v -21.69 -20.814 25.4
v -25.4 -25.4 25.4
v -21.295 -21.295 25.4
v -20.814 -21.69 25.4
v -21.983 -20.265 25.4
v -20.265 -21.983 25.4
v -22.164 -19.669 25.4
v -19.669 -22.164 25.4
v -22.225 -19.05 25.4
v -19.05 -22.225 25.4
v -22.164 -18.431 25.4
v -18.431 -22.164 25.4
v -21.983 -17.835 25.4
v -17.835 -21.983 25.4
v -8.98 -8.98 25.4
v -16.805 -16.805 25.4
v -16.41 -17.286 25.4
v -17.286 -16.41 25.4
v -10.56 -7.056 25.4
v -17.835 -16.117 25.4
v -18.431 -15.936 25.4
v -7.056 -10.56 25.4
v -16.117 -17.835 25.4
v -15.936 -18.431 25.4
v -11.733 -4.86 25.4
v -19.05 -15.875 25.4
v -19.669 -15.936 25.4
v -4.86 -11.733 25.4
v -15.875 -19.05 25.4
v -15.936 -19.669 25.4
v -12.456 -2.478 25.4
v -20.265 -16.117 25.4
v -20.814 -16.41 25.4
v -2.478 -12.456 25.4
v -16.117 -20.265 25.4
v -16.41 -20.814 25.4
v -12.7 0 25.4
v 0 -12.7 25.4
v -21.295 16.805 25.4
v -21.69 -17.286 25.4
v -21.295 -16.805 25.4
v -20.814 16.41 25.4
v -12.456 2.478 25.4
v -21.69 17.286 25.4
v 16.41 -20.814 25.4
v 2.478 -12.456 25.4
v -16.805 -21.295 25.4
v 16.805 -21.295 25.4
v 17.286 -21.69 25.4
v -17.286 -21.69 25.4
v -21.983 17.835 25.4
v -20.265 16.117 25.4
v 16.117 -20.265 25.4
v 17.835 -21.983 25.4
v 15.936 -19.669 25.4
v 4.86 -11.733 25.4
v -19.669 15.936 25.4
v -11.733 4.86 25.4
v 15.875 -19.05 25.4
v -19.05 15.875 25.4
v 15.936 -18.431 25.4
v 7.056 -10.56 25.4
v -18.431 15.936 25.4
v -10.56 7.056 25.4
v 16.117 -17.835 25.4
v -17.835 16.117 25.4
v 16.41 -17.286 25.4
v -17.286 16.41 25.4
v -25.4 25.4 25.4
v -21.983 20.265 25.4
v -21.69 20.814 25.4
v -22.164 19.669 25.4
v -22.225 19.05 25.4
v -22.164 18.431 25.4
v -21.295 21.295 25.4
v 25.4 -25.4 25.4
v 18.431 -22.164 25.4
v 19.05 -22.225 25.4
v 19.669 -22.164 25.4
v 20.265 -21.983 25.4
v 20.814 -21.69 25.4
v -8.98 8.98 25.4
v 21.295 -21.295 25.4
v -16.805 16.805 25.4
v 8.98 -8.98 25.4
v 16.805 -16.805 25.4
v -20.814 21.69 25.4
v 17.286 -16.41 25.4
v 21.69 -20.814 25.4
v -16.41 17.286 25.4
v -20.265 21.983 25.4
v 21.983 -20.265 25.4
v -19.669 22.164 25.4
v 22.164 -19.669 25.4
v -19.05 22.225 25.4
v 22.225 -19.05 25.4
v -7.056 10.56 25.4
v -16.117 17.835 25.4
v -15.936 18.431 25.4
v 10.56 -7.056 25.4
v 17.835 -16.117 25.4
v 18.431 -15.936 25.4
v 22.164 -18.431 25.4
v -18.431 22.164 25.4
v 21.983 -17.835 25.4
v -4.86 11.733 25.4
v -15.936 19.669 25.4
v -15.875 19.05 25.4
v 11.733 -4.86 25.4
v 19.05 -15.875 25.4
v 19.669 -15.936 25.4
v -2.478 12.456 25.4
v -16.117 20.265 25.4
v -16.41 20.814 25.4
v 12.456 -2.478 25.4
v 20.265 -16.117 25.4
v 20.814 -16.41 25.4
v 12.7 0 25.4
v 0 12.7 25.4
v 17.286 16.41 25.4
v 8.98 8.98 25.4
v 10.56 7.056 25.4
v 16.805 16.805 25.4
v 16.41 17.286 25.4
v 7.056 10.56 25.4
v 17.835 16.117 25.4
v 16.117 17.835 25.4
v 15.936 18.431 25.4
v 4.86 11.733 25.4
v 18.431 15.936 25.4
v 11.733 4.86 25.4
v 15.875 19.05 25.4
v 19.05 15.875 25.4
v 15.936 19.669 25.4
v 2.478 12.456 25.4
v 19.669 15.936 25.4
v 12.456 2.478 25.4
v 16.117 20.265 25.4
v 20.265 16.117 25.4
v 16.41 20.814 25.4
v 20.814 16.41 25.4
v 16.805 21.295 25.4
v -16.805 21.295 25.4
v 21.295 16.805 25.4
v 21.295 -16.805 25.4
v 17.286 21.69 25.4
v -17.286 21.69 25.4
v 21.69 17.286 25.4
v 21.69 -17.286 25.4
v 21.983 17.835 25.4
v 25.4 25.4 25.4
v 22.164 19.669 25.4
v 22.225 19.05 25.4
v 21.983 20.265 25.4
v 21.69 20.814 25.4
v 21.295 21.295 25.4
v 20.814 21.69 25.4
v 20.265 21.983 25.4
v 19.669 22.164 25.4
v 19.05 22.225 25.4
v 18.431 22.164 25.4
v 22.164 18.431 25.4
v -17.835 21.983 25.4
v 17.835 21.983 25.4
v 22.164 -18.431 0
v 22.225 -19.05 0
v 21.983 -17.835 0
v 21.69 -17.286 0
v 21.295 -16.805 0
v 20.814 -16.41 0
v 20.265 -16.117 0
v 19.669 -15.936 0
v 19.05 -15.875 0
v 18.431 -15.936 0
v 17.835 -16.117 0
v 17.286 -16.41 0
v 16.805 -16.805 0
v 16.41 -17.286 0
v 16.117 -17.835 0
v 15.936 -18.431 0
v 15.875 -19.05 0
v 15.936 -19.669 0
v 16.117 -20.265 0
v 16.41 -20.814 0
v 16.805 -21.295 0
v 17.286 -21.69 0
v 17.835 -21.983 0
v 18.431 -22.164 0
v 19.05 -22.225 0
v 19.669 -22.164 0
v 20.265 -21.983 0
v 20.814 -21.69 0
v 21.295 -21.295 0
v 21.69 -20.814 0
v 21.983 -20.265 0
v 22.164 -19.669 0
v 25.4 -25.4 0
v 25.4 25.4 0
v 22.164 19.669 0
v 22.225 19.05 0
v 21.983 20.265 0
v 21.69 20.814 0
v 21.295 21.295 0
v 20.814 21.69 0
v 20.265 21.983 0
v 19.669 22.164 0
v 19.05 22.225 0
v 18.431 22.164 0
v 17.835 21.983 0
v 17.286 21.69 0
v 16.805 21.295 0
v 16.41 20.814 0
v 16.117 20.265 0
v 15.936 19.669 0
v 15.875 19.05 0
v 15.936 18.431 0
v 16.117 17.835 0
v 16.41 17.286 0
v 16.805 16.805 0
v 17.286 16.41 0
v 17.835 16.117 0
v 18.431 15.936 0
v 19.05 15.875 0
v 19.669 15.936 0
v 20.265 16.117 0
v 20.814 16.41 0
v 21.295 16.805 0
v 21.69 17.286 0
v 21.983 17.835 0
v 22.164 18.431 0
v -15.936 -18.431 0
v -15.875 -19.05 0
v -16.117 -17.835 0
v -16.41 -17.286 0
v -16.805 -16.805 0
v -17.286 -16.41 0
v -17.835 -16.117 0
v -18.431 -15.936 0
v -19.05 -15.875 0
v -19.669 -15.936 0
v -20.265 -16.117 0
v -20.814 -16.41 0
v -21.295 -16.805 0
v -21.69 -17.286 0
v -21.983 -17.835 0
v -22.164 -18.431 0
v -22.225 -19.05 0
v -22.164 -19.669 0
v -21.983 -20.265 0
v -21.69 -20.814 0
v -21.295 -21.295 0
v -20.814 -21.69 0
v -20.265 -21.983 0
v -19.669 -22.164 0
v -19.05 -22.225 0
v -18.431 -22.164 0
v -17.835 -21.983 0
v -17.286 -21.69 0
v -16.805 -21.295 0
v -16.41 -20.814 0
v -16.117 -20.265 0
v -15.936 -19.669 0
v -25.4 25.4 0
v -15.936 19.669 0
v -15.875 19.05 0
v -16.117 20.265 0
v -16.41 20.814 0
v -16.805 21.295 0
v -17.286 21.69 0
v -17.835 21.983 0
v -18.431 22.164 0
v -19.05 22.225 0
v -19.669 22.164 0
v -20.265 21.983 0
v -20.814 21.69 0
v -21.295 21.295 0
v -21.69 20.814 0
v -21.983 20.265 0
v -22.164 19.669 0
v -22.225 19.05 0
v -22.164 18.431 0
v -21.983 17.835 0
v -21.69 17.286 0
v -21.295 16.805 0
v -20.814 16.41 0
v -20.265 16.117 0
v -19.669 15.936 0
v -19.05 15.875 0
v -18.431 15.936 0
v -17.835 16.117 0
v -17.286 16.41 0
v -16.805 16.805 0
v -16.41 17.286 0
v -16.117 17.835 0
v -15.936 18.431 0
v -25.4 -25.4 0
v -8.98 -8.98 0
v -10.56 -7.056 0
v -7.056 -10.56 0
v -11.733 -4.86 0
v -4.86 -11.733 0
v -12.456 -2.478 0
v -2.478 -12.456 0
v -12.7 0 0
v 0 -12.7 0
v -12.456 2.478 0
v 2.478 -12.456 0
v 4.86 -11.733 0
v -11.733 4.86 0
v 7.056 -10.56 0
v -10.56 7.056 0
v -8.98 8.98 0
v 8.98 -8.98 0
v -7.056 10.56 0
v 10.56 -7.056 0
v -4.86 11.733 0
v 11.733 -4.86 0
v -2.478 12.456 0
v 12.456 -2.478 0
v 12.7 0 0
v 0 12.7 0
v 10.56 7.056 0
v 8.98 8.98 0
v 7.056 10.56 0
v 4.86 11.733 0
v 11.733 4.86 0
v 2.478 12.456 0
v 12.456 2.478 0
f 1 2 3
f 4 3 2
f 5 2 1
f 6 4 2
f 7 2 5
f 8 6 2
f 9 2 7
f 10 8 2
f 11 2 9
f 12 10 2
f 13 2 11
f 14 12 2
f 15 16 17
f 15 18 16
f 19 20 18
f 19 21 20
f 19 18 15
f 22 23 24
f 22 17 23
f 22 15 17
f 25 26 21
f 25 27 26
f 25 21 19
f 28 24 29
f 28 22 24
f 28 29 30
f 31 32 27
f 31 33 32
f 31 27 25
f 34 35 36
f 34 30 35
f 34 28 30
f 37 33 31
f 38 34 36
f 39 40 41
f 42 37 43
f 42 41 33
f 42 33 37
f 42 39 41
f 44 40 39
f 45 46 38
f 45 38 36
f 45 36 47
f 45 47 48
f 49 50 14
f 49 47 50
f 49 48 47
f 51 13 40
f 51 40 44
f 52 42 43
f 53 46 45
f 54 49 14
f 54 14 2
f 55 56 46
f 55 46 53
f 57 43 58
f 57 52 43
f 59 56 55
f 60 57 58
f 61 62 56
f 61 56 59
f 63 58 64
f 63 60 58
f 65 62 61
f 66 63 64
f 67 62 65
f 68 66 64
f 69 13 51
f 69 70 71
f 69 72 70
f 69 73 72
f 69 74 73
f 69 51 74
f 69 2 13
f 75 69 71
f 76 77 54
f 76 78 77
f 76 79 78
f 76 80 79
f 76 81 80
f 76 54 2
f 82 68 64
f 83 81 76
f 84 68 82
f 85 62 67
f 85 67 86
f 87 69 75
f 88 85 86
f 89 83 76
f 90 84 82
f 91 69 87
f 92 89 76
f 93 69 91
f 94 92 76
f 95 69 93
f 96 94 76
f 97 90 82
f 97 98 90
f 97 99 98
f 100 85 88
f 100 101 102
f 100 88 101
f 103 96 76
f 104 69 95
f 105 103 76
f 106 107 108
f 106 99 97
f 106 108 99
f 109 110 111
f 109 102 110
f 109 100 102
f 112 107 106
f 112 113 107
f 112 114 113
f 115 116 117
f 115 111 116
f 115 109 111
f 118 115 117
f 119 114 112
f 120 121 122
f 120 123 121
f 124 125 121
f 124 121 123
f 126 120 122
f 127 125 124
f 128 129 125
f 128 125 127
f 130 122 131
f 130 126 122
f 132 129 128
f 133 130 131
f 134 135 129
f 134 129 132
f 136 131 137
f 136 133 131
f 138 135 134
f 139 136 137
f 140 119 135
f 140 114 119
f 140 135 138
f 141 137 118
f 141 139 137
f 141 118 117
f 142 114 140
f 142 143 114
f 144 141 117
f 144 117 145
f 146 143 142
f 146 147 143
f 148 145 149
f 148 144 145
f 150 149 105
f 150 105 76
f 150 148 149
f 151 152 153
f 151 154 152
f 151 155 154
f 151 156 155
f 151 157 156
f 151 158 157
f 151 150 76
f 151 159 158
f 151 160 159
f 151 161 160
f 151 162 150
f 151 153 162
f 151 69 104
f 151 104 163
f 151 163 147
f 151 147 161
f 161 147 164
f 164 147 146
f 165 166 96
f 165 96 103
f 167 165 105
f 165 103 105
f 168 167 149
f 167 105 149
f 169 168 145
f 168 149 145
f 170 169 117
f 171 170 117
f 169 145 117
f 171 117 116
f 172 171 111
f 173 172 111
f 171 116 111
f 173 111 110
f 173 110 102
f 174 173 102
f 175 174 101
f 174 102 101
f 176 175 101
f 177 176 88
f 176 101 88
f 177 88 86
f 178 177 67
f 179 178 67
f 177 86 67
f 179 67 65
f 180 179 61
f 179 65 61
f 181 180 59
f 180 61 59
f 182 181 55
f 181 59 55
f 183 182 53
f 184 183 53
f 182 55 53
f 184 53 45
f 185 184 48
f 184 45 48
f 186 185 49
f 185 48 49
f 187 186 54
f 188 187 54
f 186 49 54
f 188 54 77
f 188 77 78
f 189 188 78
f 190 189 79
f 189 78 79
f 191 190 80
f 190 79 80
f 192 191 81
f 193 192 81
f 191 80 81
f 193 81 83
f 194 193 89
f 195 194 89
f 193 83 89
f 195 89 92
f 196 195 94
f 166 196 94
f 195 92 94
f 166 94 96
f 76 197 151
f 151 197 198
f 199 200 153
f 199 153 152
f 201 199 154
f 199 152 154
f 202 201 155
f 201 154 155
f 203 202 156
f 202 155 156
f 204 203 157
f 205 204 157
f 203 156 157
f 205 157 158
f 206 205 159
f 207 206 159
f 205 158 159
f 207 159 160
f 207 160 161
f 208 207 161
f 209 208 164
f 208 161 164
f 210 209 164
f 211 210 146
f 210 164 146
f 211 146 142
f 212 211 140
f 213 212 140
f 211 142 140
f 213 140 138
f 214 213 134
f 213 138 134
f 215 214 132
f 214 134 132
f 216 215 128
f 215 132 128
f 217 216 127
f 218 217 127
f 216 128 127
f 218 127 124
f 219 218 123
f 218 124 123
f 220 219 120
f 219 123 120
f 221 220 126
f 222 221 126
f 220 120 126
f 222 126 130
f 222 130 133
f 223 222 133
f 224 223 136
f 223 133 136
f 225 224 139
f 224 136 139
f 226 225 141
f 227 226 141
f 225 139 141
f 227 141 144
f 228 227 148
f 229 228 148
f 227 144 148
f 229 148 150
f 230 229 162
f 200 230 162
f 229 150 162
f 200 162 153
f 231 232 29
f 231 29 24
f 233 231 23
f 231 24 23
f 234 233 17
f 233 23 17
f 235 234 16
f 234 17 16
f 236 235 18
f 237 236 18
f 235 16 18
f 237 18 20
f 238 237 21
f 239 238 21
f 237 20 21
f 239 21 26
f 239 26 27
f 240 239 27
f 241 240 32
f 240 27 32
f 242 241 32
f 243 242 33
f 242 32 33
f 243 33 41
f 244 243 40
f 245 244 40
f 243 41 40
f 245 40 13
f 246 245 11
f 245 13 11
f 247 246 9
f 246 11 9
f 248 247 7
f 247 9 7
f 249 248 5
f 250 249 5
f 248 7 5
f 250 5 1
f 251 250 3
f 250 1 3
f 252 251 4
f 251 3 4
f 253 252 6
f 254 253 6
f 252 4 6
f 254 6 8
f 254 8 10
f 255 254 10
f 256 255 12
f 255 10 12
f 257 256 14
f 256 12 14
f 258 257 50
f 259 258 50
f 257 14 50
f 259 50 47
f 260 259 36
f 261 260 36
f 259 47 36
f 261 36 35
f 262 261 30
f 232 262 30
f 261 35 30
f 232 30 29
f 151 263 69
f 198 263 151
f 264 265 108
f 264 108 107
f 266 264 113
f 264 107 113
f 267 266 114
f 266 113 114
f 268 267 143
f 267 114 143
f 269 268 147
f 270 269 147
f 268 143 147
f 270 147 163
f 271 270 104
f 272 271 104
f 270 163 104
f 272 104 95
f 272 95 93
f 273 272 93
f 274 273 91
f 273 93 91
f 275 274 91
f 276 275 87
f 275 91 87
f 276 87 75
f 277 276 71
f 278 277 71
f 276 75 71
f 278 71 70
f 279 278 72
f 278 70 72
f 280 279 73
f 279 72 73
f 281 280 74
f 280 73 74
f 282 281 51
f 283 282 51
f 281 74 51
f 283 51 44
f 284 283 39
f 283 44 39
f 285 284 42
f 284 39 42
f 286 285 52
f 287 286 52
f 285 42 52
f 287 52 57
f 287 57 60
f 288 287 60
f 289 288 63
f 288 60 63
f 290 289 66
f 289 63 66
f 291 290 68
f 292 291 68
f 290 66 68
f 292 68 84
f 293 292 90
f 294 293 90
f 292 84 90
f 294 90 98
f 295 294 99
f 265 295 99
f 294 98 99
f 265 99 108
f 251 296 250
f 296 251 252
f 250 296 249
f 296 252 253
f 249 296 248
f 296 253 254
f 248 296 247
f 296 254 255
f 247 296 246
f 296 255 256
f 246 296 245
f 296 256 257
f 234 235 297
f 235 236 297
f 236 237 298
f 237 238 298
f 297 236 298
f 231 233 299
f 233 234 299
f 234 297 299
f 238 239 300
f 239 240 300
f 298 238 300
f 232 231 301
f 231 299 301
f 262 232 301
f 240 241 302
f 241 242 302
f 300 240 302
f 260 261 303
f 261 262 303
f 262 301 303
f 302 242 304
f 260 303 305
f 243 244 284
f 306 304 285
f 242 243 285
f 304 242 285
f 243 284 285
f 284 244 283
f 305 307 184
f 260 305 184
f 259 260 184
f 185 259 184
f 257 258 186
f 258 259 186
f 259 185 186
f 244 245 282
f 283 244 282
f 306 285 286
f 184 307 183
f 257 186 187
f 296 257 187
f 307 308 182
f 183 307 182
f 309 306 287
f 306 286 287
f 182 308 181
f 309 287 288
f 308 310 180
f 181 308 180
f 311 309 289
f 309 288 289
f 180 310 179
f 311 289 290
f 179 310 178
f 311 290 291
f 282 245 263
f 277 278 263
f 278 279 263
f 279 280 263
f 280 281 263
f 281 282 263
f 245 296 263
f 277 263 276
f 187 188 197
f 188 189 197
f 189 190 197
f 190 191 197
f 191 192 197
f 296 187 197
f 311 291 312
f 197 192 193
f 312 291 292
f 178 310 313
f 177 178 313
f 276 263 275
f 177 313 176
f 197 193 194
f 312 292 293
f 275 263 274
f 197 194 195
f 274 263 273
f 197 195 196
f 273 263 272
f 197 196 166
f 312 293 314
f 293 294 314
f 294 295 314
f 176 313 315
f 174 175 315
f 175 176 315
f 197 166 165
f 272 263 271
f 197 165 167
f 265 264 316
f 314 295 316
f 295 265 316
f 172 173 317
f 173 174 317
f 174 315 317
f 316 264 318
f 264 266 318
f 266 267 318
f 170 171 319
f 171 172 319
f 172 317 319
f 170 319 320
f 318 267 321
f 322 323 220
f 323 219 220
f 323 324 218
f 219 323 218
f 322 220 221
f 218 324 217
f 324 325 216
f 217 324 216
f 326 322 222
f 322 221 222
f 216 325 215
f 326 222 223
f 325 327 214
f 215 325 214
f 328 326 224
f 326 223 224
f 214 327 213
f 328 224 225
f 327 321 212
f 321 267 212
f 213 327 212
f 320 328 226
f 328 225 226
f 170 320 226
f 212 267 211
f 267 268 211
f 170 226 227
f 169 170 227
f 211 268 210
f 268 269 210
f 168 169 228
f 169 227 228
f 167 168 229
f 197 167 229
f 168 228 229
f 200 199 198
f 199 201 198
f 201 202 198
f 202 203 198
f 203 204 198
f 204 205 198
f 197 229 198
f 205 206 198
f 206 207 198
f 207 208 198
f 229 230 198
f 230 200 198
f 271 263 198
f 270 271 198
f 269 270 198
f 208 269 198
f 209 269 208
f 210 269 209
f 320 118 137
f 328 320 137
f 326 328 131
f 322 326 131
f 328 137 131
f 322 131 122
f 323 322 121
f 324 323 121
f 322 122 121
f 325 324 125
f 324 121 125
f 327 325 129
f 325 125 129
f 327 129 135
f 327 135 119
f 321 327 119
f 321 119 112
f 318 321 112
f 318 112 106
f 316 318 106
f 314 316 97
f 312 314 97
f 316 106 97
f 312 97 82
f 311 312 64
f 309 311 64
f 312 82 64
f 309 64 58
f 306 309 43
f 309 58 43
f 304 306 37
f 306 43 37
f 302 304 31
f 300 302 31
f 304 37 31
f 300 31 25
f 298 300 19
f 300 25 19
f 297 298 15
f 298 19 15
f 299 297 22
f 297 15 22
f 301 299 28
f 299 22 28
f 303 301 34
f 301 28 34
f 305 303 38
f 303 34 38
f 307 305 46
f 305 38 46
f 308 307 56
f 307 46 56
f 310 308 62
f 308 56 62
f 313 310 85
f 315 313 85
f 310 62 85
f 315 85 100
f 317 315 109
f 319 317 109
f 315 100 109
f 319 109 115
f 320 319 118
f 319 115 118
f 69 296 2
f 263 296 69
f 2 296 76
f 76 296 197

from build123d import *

# Parameters (mm, degrees)
SKETCH4_W           = 50.8
SKETCH4_H           = 50.8
BOSS_EXTRUDE2_DEPTH = 25.4
SKETCH5_R           = 3.175
SKETCH5_R_2         = 12.7
CUT_EXTRUDE5_DEPTH  = 25.4


with BuildPart() as part:
    # Sketch4 → Boss-Extrude2 (new body)
    with BuildSketch(Plane.XY):
        Rectangle(SKETCH4_W, SKETCH4_H)
    extrude(amount=BOSS_EXTRUDE2_DEPTH)

    # Sketch5 → Cut-Extrude5 (cut)
    with BuildSketch(Plane.XY.offset(25.4)):
        with Locations((19.05, 19.05)):
            Circle(SKETCH5_R)
        Circle(SKETCH5_R_2)
        with Locations((-19.05, 19.05)):
            Circle(SKETCH5_R)
        with Locations((19.05, -19.05)):
            Circle(SKETCH5_R)
        with Locations((-19.05, -19.05)):
            Circle(SKETCH5_R)
    extrude(amount=-CUT_EXTRUDE5_DEPTH, mode=Mode.SUBTRACT)


solid = part.part
